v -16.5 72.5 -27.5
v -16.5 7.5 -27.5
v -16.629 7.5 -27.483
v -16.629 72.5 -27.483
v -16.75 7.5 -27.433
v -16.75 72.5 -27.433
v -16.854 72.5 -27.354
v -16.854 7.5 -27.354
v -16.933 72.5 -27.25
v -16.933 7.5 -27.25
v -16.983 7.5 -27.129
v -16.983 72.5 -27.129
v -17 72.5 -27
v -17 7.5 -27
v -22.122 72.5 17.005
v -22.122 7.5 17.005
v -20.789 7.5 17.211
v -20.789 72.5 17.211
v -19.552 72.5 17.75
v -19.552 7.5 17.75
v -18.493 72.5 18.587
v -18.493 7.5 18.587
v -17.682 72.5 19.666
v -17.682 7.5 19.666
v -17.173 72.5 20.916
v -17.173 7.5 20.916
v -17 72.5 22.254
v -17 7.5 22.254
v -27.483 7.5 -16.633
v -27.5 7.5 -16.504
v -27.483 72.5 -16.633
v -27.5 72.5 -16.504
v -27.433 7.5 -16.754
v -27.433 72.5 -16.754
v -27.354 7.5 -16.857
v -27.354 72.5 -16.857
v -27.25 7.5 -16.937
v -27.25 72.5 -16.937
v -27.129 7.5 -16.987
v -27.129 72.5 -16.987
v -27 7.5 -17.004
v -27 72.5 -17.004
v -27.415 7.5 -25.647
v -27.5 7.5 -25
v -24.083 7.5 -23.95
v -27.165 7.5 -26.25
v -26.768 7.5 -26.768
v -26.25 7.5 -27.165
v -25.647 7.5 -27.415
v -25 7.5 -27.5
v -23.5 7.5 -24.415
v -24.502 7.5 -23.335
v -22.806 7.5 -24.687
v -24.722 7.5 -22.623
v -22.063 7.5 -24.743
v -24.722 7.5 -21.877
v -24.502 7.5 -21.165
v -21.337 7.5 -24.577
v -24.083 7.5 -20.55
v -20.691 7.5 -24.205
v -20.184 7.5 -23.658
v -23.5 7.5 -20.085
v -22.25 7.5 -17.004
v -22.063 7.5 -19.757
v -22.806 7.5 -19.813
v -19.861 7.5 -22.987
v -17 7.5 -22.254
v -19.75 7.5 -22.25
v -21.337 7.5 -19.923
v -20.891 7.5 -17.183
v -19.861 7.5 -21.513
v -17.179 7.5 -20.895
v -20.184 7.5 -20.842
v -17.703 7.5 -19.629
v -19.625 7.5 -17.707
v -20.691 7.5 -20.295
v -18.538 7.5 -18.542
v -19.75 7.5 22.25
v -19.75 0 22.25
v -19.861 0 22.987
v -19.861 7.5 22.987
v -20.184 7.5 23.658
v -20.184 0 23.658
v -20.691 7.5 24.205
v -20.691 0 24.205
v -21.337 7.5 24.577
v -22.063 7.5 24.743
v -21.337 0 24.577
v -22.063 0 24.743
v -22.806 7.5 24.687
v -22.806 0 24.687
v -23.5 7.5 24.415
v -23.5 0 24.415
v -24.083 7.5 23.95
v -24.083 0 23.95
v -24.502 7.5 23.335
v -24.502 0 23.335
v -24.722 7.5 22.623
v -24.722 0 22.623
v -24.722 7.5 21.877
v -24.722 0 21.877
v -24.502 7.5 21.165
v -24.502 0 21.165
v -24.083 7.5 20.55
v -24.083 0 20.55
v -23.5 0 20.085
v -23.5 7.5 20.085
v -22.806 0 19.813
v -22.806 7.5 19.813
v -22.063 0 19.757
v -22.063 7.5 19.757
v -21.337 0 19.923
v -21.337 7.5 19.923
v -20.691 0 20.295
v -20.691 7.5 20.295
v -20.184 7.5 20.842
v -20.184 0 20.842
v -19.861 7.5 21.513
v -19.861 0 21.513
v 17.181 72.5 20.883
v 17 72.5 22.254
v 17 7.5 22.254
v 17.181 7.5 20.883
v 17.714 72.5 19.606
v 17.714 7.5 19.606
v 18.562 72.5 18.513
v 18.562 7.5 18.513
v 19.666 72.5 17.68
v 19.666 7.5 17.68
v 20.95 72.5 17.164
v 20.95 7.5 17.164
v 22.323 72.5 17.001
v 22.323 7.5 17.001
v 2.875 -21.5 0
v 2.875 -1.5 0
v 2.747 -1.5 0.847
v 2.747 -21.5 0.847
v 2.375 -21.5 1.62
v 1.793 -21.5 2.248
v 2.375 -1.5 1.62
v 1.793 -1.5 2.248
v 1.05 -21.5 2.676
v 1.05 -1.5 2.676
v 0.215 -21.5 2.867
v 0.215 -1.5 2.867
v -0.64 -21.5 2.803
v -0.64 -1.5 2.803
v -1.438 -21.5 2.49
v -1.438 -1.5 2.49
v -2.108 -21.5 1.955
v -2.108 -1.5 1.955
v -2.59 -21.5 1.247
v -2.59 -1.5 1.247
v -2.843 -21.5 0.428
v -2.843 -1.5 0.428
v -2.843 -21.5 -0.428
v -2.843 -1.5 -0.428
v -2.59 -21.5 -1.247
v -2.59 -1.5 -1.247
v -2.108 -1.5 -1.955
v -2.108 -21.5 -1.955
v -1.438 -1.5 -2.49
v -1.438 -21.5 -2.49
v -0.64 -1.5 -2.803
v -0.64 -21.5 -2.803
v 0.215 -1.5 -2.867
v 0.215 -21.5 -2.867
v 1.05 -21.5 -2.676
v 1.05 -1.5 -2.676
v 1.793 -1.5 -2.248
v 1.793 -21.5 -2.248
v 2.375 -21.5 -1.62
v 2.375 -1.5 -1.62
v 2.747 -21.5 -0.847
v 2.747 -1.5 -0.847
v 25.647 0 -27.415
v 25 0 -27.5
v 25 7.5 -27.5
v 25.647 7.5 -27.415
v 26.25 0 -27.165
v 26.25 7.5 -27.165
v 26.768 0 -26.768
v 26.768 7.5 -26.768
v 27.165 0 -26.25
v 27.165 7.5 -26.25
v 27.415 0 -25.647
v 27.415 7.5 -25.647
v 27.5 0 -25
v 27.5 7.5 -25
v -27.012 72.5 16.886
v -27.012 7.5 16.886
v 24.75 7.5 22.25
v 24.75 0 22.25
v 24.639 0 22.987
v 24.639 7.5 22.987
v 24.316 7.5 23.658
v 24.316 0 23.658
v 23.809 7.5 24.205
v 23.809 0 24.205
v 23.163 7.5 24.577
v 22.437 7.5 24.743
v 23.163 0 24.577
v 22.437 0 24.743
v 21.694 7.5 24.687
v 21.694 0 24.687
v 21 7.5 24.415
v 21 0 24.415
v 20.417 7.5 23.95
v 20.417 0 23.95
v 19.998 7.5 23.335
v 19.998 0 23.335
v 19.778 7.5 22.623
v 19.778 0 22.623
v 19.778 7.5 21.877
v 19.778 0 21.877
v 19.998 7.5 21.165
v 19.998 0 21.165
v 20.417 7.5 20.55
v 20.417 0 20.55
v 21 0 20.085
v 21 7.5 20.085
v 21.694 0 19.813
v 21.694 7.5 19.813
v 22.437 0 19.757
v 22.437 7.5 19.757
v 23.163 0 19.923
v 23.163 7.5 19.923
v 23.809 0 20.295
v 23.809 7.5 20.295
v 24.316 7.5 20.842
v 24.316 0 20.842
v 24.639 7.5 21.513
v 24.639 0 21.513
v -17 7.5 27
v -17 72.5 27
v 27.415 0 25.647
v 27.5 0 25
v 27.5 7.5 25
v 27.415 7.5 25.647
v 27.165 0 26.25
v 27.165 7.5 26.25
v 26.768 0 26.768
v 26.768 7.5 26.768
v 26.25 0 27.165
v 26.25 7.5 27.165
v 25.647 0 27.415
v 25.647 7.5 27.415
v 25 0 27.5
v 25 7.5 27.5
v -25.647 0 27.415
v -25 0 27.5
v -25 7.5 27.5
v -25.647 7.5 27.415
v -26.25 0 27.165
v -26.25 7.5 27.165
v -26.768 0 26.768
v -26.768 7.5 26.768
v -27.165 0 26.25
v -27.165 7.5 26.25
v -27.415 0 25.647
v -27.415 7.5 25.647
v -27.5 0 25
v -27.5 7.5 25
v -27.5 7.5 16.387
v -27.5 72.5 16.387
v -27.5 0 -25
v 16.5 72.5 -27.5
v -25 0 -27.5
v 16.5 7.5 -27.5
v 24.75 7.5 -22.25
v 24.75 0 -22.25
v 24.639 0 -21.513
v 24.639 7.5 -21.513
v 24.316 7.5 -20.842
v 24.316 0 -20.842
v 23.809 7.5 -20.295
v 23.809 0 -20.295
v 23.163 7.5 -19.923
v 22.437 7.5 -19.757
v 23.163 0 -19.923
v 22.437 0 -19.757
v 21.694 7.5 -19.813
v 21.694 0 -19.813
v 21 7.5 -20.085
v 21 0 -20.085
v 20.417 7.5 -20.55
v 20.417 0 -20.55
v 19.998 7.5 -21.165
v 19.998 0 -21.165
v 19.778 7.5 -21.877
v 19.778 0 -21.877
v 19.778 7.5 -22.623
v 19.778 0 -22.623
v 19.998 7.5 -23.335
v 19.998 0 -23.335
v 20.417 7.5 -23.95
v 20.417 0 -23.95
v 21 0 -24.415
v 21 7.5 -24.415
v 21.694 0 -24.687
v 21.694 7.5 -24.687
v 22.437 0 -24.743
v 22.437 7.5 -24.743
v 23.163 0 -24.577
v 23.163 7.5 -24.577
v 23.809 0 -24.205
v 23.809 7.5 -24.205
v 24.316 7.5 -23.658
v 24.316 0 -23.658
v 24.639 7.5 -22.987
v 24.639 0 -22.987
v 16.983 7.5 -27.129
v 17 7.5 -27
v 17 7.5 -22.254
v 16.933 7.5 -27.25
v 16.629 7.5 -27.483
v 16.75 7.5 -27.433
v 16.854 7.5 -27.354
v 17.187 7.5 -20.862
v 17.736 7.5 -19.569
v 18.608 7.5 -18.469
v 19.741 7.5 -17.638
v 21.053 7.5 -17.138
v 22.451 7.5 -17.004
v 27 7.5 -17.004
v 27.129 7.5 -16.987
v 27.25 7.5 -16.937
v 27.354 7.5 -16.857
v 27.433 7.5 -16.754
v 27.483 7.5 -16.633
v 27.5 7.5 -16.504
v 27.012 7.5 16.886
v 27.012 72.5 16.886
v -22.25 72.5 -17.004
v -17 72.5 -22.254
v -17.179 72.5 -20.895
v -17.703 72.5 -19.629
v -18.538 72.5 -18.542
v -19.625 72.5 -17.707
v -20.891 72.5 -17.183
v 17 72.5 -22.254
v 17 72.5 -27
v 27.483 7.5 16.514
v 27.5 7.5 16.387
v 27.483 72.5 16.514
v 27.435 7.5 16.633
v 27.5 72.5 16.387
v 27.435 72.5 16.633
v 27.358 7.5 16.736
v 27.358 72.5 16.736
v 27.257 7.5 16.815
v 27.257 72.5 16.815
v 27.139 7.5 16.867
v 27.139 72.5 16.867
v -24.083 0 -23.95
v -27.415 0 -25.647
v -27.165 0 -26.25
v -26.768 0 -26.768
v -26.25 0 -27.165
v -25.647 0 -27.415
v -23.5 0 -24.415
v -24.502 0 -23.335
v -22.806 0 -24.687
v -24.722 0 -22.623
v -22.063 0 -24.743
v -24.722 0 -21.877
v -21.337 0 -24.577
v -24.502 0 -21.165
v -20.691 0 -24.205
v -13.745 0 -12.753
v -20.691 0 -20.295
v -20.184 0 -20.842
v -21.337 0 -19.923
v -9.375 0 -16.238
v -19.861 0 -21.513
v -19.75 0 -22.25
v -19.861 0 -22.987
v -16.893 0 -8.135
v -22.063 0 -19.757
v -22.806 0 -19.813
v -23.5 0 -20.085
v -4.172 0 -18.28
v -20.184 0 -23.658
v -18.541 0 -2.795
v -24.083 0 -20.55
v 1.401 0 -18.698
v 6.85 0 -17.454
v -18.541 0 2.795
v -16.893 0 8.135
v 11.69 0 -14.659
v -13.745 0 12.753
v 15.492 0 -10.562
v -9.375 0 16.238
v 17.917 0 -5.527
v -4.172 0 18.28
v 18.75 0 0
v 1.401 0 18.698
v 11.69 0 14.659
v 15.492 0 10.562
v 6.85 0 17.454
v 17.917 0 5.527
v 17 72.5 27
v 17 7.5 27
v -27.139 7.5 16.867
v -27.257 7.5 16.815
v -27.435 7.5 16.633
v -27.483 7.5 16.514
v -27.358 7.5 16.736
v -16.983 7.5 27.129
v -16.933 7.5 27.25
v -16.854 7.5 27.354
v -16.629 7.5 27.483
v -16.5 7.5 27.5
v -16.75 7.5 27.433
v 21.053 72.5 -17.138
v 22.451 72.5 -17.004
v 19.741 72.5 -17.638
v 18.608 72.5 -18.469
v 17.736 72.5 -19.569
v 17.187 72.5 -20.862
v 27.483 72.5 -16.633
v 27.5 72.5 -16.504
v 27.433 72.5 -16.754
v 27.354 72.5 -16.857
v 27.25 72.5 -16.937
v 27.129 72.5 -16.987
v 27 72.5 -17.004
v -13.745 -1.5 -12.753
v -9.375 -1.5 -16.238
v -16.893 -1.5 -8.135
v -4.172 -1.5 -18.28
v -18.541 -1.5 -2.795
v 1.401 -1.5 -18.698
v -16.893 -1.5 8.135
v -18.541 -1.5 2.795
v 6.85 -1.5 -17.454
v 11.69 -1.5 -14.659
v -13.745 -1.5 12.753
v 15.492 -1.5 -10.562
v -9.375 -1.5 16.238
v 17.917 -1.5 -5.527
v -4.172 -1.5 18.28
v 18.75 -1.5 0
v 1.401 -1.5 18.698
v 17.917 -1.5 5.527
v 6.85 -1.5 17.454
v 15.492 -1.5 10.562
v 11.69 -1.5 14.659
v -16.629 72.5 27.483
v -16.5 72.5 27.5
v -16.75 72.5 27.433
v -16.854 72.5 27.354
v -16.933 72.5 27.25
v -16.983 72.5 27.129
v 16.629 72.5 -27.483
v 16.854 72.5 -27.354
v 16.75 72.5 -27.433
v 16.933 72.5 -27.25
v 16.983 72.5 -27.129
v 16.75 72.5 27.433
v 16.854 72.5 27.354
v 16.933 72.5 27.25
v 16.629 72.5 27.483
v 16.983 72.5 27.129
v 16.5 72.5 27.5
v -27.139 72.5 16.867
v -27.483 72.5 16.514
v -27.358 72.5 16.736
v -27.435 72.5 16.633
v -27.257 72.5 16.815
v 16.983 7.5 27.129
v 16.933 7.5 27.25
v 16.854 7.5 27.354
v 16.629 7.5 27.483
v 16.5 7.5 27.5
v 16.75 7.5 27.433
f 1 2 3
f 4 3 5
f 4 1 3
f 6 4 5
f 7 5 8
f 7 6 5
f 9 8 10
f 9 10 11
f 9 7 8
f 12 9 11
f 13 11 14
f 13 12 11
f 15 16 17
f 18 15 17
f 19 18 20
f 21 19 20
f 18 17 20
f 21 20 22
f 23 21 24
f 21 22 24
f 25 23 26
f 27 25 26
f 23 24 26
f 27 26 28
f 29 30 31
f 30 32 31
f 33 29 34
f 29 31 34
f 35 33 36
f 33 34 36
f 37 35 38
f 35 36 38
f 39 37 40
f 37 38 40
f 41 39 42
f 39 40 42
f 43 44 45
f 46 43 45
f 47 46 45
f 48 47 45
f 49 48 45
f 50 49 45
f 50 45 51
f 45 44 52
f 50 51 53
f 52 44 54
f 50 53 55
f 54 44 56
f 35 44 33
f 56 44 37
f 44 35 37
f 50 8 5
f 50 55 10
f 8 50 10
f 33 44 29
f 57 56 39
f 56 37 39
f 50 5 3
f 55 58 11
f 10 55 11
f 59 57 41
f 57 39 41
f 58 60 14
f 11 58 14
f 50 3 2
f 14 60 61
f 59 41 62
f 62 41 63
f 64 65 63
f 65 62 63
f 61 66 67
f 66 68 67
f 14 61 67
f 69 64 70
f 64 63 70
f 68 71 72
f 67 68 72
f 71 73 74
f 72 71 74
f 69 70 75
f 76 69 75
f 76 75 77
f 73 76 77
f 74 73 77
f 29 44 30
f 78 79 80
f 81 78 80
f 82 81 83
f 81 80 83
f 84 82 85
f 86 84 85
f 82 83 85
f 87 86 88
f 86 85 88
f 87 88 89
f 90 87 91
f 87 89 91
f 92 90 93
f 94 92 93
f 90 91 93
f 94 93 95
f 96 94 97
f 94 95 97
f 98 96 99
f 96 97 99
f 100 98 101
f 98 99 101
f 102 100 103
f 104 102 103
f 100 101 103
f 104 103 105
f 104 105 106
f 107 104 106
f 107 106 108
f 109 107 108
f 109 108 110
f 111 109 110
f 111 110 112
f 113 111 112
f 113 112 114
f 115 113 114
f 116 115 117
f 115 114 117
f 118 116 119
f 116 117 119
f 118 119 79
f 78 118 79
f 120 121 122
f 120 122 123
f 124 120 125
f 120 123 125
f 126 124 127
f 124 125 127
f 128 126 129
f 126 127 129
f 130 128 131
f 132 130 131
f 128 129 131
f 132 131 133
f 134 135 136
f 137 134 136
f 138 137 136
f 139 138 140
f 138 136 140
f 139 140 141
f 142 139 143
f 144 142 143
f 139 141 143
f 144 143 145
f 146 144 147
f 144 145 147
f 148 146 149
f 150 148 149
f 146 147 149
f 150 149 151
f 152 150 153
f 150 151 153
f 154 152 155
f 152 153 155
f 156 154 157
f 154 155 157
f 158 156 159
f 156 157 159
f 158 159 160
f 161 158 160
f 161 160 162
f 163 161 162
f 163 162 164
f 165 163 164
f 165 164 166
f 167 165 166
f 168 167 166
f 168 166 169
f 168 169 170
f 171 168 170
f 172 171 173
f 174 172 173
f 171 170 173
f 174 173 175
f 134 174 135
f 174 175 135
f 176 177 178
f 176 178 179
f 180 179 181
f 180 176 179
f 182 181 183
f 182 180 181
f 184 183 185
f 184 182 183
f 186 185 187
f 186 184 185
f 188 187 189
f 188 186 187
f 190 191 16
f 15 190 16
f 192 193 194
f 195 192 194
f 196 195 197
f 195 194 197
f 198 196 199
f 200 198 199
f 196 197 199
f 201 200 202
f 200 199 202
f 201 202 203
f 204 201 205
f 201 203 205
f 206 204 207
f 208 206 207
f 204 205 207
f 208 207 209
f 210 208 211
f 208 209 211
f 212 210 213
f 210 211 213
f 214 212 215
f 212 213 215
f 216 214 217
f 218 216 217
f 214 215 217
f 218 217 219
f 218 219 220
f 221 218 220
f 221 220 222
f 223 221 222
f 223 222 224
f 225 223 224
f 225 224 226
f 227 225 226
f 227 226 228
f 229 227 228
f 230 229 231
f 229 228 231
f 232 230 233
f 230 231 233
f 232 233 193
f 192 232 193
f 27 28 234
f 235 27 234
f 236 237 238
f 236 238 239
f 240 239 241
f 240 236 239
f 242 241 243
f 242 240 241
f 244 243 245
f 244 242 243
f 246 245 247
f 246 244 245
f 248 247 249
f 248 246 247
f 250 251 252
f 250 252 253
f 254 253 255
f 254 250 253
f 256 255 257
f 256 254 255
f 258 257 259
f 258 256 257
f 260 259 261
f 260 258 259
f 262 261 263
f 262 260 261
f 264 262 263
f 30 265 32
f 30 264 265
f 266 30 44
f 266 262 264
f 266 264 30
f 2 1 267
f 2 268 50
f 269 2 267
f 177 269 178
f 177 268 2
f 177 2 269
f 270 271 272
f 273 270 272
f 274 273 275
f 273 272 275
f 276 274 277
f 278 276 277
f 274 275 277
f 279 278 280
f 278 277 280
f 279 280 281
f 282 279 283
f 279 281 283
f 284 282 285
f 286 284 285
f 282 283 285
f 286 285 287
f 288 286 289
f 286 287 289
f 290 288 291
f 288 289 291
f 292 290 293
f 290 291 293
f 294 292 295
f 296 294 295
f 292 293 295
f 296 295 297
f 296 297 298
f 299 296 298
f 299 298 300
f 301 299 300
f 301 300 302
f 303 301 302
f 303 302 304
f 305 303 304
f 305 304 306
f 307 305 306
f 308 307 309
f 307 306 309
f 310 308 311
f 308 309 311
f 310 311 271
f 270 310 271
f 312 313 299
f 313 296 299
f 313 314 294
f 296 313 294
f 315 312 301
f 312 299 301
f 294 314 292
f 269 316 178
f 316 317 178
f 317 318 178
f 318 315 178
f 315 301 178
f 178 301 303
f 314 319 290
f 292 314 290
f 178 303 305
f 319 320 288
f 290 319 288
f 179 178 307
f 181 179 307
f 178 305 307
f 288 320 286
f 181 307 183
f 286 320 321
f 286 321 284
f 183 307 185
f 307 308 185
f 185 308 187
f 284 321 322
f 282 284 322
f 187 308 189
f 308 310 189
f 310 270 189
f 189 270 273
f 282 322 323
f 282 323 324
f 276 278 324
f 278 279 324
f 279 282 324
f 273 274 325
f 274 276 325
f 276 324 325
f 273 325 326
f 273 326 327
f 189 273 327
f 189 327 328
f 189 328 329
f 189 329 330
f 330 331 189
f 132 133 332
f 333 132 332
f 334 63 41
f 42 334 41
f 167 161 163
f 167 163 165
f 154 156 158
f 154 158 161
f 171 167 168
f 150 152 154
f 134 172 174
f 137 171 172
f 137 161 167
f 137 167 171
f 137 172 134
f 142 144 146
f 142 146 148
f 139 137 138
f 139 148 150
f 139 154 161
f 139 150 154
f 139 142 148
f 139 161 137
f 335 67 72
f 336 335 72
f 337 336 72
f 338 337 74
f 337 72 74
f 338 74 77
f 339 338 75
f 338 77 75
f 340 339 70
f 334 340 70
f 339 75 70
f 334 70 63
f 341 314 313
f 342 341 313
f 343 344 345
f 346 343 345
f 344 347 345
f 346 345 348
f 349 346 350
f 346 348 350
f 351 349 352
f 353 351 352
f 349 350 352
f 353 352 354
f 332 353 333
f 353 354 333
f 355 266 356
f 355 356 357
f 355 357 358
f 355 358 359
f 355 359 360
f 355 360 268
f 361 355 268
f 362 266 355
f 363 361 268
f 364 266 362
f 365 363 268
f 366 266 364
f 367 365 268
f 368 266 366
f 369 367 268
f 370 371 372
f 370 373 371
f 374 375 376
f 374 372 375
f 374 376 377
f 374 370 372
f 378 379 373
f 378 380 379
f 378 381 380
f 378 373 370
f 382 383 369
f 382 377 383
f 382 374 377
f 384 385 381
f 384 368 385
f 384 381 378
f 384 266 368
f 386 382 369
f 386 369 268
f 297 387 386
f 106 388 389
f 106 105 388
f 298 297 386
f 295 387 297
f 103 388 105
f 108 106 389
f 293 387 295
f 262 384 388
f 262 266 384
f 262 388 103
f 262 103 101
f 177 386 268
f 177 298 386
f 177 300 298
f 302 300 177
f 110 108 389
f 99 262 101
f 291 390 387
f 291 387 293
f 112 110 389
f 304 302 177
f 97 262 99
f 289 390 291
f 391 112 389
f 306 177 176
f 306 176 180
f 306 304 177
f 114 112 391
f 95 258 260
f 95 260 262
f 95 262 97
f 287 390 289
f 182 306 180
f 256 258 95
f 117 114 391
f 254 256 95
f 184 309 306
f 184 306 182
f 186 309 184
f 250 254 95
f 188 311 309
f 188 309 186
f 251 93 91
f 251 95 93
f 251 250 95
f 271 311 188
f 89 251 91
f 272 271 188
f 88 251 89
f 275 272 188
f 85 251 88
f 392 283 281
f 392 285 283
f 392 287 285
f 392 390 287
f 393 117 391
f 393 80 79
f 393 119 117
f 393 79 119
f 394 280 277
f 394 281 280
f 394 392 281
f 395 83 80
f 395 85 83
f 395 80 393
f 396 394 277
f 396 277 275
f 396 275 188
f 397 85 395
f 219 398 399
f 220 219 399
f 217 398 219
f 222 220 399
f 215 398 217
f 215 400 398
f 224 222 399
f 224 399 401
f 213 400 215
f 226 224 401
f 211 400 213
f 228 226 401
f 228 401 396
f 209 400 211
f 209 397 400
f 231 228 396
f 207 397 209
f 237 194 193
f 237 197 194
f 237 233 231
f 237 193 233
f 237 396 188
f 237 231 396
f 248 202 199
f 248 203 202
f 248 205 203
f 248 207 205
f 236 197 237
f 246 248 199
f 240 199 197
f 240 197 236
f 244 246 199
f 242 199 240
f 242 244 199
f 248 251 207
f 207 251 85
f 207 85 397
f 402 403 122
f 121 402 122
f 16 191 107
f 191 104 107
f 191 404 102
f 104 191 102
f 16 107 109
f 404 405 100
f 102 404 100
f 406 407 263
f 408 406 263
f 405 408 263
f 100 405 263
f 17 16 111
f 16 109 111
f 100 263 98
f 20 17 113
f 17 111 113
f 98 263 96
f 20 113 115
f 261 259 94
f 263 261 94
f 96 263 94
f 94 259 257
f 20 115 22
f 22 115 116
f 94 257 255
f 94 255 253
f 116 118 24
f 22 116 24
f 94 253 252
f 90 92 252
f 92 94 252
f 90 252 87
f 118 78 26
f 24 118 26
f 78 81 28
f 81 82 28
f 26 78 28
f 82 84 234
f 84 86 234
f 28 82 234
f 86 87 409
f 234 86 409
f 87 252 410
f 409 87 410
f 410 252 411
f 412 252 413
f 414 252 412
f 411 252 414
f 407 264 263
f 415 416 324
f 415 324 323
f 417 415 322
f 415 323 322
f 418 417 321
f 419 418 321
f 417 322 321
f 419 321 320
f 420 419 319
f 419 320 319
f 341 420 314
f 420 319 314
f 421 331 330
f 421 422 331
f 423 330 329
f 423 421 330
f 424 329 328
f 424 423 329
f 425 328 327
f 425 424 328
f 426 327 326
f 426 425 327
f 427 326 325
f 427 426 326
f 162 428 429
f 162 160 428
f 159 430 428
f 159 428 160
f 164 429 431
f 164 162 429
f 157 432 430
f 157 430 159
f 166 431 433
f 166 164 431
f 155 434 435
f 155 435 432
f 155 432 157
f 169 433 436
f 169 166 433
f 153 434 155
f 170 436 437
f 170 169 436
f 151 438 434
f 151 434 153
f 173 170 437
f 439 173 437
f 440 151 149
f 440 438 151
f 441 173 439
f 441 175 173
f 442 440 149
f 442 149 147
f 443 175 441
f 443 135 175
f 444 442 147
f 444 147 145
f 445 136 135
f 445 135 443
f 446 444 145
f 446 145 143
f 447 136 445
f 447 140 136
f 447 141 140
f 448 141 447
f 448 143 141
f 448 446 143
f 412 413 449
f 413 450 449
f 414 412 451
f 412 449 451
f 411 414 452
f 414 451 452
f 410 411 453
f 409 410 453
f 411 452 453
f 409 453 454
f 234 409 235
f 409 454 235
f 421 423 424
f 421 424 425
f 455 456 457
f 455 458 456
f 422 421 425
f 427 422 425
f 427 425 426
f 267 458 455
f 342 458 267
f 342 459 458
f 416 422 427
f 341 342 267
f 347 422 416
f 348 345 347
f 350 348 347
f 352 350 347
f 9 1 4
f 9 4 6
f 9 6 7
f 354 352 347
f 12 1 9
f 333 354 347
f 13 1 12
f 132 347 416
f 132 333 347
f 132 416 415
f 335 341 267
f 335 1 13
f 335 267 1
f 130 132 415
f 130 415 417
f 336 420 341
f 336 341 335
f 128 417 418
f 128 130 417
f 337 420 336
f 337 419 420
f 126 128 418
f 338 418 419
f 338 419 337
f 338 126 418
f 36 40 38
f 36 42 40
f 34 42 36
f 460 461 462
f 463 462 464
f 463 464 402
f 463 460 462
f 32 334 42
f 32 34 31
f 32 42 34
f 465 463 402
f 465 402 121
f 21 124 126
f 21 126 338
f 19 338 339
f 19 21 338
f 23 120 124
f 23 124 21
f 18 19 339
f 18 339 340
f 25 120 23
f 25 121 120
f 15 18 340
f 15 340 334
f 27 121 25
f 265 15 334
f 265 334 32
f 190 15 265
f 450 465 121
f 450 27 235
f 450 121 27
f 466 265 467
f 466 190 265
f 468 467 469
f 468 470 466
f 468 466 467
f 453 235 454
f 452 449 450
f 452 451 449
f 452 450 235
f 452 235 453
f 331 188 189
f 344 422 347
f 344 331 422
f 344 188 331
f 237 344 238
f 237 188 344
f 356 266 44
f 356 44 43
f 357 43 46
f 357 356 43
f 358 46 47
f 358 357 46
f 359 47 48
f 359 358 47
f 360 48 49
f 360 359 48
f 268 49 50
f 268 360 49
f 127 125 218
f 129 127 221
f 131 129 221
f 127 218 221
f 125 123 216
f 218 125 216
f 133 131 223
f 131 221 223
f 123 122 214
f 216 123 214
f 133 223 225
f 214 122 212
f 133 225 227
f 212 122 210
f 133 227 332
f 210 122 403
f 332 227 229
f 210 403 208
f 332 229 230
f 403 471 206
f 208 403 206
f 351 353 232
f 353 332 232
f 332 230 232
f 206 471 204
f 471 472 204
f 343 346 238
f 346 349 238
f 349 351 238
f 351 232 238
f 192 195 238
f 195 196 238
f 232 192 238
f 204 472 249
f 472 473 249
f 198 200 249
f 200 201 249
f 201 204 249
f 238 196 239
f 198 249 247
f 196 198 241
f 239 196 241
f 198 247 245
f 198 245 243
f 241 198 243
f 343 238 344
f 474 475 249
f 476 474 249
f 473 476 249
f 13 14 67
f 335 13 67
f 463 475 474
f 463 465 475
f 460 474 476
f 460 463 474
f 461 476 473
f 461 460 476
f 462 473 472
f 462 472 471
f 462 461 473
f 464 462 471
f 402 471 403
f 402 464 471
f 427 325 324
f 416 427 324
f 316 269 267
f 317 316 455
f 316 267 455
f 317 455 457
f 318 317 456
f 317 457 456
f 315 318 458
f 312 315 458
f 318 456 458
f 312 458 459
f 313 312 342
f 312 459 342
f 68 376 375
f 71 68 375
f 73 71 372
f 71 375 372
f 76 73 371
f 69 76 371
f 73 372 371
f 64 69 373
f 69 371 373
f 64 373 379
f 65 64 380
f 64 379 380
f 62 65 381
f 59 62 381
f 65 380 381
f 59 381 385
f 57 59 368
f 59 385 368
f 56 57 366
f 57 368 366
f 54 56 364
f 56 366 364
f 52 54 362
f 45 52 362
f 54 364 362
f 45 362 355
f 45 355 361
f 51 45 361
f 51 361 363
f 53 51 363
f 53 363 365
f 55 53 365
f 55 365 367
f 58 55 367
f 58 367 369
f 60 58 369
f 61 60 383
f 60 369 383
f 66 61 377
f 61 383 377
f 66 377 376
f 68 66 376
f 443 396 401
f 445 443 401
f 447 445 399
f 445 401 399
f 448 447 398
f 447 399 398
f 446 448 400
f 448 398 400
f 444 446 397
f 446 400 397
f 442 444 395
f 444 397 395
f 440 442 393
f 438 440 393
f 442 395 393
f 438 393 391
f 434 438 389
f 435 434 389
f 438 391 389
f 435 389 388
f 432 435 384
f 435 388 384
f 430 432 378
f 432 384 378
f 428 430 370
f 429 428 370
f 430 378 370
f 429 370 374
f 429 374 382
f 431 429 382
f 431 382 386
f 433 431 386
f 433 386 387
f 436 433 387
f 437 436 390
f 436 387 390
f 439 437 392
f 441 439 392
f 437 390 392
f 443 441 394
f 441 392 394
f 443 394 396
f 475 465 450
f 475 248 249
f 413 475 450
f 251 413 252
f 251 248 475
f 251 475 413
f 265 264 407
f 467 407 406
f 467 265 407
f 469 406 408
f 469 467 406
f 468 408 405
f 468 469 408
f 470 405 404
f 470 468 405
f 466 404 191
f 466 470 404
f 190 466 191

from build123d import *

# Parameters (mm, degrees)
F0_R     = 18.75
F1_DEPTH = 1.5
F0_R_2   = 2.5
F2_DEPTH = 7.5
F4_DEPTH = 65
F5_R     = 0.5
F6_R     = 2.875
F7_DEPTH = 20


with BuildPart() as f1:
    # F0 (on Front) → F1 (new body)
    with BuildSketch(Plane.XZ):
        Circle(F0_R)
    extrude(amount=F1_DEPTH)

    # F0 (on Front) → F2 (join)
    with BuildSketch(Plane.XZ):
        with BuildLine():
            Line((25, 27.5), (-25, 27.5))
            ThreePointArc((-25, 27.5), (-26.767766953, 26.767766953), (-27.5, 25))
            Line((-27.5, 25), (-27.5, -25))
            ThreePointArc((-27.5, -25), (-26.767766953, -26.767766953), (-25, -27.5))
            Line((-25, -27.5), (25, -27.5))
            ThreePointArc((25, -27.5), (26.767766953, -26.767766953), (27.5, -25))
            Line((27.5, -25), (27.5, 25))
            ThreePointArc((27.5, 25), (26.767766953, 26.767766953), (25, 27.5))
        make_face()
        with Locations((-22.25, -22.25)):
            Circle(F0_R_2, mode=Mode.SUBTRACT)
        with Locations((22.25, -22.25)):
            Circle(F0_R_2, mode=Mode.SUBTRACT)
        with Locations((-22.25, 22.25)):
            Circle(F0_R_2, mode=Mode.SUBTRACT)
        Circle(F0_R, mode=Mode.SUBTRACT)
        with Locations((22.25, 22.25)):
            Circle(F0_R_2, mode=Mode.SUBTRACT)
        Circle(F0_R)
    extrude(amount=-F2_DEPTH)

    # F3 (on face) → F4 (join)
    with BuildSketch(Plane(origin=(0, 7.5, 0), x_dir=(-1, 0, 0), z_dir=(0, 1, 0))):
        with BuildLine():
            Line((27.5, -17.0038467285), (27.5, 16.874561323))
            Line((27.5, 16.874561323), (22.1223071391, 17.0053998878))
            ThreePointArc((22.1223071391, 17.0053998878), (18.4928159277, 18.5869603521), (17.000002275, 22.253845591))
            Line((17.000002275, 22.253845591), (17.000002275, 27.5))
            Line((17.000002275, 27.5), (-17.000002275, 27.5))
            Line((-17.000002275, 27.5), (-17.000002275, 22.253845591))
            ThreePointArc((-17.000002275, 22.253845591), (-18.5623015375, 18.5132408344), (-22.3232260335, 17.0005115574))
            Line((-22.3232260335, 17.0005115574), (-27.5, 16.874561323))
            Line((-27.5, 16.874561323), (-27.5, -17.0038467285))
            Line((-27.5, -17.0038467285), (-22.4509152226, -17.0038467285))
            ThreePointArc((-22.4509152226, -17.0038467285), (-18.6080321838, -18.4686563976), (-17.000002275, -22.253845591))
            Line((-17.000002275, -22.253845591), (-17.000002275, -27.5))
            Line((-17.000002275, -27.5), (17.000002275, -27.5))
            Line((17.000002275, -27.5), (17.000002275, -22.253845591))
            ThreePointArc((17.000002275, -22.253845591), (18.5376913406, -18.5415357941), (22.2500011375, -17.0038467285))
            Line((22.2500011375, -17.0038467285), (27.5, -17.0038467285))
        make_face()
    extrude(amount=F4_DEPTH)

    # F5
    f5_edges = [f1.edges().sort_by_distance(p)[0] for p in [
        (17.000002, 40, 27.5),
        (-17.000002, 40, 27.5),
        (27.5, 40, -17.003847),
        (27.5, 40, 16.874561),
        (-27.5, 40, 16.874561),
        (-27.5, 40, -17.003847),
        (-17.000002, 40, -27.5),
        (17.000002, 40, -27.5),
    ]]
    fillet(f5_edges, radius=F5_R)

    # F6 (on face) → F7 (join)
    with BuildSketch(Plane.XZ.offset(1.5)):
        Circle(F6_R)
    extrude(amount=F7_DEPTH)


solid = f1.part
